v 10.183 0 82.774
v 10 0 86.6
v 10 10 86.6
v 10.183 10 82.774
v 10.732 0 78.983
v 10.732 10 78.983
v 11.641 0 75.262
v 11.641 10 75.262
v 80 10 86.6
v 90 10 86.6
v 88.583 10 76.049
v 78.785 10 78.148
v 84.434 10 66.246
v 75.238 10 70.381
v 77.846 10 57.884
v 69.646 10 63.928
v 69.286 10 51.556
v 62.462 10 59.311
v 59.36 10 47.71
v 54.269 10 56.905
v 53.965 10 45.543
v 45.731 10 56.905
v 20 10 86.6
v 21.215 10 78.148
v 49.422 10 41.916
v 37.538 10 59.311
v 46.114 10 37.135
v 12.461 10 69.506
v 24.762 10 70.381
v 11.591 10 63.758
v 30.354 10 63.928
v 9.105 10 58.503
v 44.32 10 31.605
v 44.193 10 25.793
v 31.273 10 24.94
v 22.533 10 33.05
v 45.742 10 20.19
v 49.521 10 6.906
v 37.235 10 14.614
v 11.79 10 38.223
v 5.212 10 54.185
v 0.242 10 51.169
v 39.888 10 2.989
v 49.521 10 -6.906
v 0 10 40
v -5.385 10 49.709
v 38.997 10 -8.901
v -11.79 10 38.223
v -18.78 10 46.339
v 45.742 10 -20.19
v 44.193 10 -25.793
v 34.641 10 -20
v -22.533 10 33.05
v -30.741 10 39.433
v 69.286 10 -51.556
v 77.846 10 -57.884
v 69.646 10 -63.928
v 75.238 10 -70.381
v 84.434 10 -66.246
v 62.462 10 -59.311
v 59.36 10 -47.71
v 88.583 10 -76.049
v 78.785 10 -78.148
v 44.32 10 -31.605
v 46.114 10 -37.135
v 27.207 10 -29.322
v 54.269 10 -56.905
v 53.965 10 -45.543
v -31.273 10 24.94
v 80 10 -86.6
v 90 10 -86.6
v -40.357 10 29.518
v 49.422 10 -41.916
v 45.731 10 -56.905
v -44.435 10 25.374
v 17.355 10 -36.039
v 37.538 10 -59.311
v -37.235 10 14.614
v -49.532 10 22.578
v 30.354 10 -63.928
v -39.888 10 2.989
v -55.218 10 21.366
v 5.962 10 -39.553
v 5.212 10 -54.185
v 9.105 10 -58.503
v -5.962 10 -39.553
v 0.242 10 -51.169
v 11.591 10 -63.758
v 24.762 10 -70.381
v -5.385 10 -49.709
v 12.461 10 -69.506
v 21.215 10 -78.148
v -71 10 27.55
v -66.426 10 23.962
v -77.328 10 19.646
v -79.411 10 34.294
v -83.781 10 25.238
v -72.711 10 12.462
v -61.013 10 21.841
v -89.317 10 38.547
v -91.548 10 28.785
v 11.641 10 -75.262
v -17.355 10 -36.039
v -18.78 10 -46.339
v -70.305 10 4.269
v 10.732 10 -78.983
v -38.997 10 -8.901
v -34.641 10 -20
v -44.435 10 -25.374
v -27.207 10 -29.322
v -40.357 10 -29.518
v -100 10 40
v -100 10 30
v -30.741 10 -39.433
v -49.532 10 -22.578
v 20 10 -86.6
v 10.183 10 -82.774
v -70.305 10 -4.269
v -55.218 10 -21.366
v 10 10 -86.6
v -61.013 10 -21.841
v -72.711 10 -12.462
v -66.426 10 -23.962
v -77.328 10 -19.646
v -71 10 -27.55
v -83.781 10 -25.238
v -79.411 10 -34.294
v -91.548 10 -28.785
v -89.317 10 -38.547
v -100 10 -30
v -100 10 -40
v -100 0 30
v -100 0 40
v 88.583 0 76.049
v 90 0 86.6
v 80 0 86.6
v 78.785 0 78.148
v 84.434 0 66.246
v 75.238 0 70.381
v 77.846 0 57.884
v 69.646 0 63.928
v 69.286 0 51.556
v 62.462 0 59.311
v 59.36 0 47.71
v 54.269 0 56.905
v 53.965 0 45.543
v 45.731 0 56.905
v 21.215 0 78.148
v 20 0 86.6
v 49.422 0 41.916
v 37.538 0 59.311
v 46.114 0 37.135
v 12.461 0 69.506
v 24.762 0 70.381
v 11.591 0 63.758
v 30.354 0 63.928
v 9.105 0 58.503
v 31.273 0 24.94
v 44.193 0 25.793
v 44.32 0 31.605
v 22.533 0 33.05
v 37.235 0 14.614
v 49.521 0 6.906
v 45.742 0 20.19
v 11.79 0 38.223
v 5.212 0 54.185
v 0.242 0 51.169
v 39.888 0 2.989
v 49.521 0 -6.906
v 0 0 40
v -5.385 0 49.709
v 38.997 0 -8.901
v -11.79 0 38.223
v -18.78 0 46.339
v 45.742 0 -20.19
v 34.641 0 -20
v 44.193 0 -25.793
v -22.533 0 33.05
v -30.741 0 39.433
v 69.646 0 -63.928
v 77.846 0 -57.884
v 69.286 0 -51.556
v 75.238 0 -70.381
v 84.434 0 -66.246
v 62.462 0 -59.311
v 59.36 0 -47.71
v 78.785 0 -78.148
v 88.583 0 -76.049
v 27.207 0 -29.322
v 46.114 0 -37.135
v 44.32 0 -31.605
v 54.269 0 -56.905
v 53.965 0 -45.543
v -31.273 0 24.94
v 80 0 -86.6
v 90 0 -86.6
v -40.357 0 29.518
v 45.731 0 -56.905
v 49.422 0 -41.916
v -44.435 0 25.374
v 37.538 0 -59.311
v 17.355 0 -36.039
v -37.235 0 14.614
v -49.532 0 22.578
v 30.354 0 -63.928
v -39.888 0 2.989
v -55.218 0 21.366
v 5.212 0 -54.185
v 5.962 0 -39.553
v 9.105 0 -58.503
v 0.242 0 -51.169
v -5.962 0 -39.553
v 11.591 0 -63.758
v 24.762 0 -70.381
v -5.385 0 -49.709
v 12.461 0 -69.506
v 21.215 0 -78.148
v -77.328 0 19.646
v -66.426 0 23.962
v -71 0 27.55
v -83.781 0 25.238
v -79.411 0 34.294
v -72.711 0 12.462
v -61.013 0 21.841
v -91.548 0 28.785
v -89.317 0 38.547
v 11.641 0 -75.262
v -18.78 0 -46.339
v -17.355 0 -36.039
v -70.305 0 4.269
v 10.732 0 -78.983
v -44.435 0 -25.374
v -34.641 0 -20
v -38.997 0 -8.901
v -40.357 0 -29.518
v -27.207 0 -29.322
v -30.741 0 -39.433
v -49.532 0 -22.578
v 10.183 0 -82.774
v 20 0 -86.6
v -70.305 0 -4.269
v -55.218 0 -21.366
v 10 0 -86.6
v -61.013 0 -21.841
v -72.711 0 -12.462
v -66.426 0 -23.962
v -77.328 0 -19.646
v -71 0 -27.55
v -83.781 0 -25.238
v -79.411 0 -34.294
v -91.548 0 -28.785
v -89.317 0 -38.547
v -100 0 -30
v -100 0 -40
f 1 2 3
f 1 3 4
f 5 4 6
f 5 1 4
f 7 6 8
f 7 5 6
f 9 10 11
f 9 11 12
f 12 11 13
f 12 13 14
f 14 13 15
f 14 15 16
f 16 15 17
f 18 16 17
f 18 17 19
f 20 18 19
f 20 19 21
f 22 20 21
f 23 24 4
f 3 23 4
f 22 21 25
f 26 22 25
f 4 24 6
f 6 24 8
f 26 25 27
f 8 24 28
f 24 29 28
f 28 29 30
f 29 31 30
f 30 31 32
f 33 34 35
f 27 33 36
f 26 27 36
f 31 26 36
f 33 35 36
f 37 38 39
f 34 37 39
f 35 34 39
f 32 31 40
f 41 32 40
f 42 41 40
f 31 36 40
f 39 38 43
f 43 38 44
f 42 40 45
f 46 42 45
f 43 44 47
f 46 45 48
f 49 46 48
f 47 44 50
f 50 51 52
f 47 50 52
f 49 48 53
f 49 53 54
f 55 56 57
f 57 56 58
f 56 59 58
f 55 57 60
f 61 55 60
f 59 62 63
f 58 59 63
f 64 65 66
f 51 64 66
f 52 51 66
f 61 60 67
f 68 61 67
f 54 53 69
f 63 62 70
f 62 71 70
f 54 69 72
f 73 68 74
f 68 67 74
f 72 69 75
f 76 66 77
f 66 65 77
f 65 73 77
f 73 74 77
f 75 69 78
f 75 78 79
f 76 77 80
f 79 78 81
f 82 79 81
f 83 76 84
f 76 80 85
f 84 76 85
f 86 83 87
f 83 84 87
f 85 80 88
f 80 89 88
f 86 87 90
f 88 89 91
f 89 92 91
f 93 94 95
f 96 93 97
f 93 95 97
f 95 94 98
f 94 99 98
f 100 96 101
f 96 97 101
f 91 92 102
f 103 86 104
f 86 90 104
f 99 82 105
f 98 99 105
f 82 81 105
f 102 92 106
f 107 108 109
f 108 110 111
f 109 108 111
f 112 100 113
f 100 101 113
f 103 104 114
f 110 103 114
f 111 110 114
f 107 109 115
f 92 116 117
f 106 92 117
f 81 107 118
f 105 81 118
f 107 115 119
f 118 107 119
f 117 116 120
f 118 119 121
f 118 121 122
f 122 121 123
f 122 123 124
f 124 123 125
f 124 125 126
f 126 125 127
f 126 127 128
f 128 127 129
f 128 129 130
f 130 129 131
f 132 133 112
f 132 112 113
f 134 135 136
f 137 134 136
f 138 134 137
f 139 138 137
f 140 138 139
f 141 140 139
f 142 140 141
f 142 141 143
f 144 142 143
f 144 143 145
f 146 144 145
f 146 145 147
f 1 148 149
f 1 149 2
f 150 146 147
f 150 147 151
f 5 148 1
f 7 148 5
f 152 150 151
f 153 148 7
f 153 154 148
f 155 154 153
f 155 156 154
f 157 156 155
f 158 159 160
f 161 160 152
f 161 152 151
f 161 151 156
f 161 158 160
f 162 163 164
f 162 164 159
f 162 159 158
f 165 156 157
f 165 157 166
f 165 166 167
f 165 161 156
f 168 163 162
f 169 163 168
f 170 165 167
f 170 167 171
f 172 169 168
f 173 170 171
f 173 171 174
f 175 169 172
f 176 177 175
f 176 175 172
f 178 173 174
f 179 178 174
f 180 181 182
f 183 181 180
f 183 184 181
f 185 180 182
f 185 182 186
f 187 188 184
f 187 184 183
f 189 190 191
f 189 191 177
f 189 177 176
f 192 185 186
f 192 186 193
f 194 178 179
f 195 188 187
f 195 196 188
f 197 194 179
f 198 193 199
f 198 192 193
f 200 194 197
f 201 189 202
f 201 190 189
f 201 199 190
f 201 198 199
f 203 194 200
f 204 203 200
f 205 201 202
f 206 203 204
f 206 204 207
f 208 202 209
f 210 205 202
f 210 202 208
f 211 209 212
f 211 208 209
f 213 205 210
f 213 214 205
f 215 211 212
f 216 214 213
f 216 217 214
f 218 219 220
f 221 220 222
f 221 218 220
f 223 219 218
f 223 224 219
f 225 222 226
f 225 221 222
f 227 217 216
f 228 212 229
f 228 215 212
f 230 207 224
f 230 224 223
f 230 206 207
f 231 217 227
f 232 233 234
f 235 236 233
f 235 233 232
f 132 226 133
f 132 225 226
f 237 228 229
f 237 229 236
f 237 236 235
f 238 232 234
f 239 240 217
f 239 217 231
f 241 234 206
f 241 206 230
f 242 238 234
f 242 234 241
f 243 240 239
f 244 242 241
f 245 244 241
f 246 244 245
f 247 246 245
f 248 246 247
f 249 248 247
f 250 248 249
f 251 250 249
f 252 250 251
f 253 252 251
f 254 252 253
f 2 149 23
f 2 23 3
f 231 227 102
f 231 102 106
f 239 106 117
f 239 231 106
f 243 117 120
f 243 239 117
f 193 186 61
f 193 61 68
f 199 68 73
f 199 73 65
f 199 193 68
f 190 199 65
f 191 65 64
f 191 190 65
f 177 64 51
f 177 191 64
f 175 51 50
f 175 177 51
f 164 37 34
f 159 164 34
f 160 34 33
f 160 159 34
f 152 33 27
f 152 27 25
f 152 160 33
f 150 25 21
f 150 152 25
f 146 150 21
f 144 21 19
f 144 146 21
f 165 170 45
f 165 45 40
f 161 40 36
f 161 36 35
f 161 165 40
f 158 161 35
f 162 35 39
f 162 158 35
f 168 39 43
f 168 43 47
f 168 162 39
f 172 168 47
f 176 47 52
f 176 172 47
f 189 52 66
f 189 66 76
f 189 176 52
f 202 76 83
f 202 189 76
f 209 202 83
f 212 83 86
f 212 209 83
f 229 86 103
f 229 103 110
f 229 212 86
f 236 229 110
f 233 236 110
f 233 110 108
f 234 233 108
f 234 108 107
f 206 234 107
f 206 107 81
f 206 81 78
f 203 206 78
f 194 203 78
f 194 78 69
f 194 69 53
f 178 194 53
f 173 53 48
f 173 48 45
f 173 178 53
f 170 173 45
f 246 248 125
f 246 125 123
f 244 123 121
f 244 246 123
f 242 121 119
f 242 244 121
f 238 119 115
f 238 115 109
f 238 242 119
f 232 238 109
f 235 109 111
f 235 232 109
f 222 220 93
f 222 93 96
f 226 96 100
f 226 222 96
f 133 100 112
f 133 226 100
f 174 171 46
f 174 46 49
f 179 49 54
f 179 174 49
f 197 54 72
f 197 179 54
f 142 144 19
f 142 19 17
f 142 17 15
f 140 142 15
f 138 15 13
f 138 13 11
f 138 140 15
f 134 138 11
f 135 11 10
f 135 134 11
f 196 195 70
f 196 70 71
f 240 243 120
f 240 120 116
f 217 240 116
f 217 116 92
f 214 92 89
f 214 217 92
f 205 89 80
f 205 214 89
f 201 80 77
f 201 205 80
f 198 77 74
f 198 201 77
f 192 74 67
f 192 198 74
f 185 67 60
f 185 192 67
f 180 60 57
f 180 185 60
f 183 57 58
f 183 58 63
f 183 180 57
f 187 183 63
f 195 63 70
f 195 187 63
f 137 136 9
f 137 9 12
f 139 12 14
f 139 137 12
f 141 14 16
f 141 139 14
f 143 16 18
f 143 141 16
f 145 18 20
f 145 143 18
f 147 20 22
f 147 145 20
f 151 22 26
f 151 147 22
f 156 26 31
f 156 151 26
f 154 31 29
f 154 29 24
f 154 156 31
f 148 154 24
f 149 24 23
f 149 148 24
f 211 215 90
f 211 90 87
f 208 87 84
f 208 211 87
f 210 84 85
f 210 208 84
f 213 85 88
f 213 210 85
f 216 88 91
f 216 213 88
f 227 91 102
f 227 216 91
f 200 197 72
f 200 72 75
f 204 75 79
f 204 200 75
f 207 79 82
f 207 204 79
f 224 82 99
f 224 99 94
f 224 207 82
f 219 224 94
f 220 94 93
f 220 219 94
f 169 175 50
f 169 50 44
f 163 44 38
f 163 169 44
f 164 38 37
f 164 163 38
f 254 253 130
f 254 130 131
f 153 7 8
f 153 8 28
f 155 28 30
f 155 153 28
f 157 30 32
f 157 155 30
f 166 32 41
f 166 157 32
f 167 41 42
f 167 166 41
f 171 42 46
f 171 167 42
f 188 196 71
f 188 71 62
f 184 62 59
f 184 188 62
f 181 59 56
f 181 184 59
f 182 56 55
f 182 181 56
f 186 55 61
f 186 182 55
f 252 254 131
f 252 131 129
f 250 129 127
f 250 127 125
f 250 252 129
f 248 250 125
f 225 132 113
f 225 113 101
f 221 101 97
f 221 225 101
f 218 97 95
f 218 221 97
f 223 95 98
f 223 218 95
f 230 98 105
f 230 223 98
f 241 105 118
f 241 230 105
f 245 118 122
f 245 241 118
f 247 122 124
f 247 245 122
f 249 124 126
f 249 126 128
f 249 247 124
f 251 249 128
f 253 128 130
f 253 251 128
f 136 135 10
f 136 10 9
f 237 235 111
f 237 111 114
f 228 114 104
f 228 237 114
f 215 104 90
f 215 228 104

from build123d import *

# Parameters (mm, degrees)
IZIM1_R                     = 40
Y_KSEKLIK_EKSTR_ZYON1_DEPTH = 10


with BuildPart() as part:
    # Çizim1 → Yükseklik-Ekstrüzyon1 (new body)
    with BuildSketch(Plane(origin=(0, 0, 0), x_dir=(1, 0, 0), z_dir=(0, 1, 0))):
        with BuildLine():
            Line((-100, -40), (-100, -30))
            ThreePointArc((-100, -30), (-70, 0), (-100, 30))
            Line((-100, 30), (-100, 40))
            ThreePointArc((-100, 40), (-84.220237409, 36.755939555), (-71, 27.549954628))
            ThreePointArc((-71, 27.549954628), (-55.218260111, 21.366045629), (-40.357142857, 29.51780853))
            ThreePointArc((-40.357142857, 29.51780853), (-25.000226369, 43.301139494), (-5.38512036, 49.709158902))
            ThreePointArc((-5.38512036, 49.709158902), (9.104684892, 58.503090991), (11.64055433, 75.261881641))
            ThreePointArc((11.64055433, 75.261881641), (10.412263093, 80.871903754), (10, 86.6))
            Line((10, 86.6), (20, 86.6))
            ThreePointArc((20, 86.6), (50, 56.6), (80, 86.6))
            Line((80, 86.6), (90, 86.6))
            ThreePointArc((90, 86.6), (81.419623277, 61.845055583), (59.359636345, 47.710448608))
            ThreePointArc((59.359636345, 47.710448608), (46.113763964, 37.135262428), (45.742467512, 20.189766365))
            ThreePointArc((45.742467512, 20.189766365), (50, 0), (45.742467512, -20.189766365))
            ThreePointArc((45.742467512, -20.189766365), (46.113763964, -37.135262428), (59.359636345, -47.710448608))
            ThreePointArc((59.359636345, -47.710448608), (81.419623277, -61.845055583), (90, -86.6))
            Line((90, -86.6), (80, -86.6))
            ThreePointArc((80, -86.6), (50, -56.6), (20, -86.6))
            Line((20, -86.6), (10, -86.6))
            ThreePointArc((10, -86.6), (10.412263093, -80.871903754), (11.64055433, -75.261881641))
            ThreePointArc((11.64055433, -75.261881641), (9.104684892, -58.503090991), (-5.38512036, -49.709158902))
            ThreePointArc((-5.38512036, -49.709158902), (-25.000226369, -43.301139494), (-40.357142857, -29.51780853))
            ThreePointArc((-40.357142857, -29.51780853), (-55.218260111, -21.366045629), (-71, -27.549954628))
            ThreePointArc((-71, -27.549954628), (-84.220237409, -36.755939555), (-100, -40))
        make_face()
        with Locations(Location((0, 0, 0), (0, 0, 270))):
            Circle(IZIM1_R, mode=Mode.SUBTRACT)
    extrude(amount=Y_KSEKLIK_EKSTR_ZYON1_DEPTH)


solid = part.part
